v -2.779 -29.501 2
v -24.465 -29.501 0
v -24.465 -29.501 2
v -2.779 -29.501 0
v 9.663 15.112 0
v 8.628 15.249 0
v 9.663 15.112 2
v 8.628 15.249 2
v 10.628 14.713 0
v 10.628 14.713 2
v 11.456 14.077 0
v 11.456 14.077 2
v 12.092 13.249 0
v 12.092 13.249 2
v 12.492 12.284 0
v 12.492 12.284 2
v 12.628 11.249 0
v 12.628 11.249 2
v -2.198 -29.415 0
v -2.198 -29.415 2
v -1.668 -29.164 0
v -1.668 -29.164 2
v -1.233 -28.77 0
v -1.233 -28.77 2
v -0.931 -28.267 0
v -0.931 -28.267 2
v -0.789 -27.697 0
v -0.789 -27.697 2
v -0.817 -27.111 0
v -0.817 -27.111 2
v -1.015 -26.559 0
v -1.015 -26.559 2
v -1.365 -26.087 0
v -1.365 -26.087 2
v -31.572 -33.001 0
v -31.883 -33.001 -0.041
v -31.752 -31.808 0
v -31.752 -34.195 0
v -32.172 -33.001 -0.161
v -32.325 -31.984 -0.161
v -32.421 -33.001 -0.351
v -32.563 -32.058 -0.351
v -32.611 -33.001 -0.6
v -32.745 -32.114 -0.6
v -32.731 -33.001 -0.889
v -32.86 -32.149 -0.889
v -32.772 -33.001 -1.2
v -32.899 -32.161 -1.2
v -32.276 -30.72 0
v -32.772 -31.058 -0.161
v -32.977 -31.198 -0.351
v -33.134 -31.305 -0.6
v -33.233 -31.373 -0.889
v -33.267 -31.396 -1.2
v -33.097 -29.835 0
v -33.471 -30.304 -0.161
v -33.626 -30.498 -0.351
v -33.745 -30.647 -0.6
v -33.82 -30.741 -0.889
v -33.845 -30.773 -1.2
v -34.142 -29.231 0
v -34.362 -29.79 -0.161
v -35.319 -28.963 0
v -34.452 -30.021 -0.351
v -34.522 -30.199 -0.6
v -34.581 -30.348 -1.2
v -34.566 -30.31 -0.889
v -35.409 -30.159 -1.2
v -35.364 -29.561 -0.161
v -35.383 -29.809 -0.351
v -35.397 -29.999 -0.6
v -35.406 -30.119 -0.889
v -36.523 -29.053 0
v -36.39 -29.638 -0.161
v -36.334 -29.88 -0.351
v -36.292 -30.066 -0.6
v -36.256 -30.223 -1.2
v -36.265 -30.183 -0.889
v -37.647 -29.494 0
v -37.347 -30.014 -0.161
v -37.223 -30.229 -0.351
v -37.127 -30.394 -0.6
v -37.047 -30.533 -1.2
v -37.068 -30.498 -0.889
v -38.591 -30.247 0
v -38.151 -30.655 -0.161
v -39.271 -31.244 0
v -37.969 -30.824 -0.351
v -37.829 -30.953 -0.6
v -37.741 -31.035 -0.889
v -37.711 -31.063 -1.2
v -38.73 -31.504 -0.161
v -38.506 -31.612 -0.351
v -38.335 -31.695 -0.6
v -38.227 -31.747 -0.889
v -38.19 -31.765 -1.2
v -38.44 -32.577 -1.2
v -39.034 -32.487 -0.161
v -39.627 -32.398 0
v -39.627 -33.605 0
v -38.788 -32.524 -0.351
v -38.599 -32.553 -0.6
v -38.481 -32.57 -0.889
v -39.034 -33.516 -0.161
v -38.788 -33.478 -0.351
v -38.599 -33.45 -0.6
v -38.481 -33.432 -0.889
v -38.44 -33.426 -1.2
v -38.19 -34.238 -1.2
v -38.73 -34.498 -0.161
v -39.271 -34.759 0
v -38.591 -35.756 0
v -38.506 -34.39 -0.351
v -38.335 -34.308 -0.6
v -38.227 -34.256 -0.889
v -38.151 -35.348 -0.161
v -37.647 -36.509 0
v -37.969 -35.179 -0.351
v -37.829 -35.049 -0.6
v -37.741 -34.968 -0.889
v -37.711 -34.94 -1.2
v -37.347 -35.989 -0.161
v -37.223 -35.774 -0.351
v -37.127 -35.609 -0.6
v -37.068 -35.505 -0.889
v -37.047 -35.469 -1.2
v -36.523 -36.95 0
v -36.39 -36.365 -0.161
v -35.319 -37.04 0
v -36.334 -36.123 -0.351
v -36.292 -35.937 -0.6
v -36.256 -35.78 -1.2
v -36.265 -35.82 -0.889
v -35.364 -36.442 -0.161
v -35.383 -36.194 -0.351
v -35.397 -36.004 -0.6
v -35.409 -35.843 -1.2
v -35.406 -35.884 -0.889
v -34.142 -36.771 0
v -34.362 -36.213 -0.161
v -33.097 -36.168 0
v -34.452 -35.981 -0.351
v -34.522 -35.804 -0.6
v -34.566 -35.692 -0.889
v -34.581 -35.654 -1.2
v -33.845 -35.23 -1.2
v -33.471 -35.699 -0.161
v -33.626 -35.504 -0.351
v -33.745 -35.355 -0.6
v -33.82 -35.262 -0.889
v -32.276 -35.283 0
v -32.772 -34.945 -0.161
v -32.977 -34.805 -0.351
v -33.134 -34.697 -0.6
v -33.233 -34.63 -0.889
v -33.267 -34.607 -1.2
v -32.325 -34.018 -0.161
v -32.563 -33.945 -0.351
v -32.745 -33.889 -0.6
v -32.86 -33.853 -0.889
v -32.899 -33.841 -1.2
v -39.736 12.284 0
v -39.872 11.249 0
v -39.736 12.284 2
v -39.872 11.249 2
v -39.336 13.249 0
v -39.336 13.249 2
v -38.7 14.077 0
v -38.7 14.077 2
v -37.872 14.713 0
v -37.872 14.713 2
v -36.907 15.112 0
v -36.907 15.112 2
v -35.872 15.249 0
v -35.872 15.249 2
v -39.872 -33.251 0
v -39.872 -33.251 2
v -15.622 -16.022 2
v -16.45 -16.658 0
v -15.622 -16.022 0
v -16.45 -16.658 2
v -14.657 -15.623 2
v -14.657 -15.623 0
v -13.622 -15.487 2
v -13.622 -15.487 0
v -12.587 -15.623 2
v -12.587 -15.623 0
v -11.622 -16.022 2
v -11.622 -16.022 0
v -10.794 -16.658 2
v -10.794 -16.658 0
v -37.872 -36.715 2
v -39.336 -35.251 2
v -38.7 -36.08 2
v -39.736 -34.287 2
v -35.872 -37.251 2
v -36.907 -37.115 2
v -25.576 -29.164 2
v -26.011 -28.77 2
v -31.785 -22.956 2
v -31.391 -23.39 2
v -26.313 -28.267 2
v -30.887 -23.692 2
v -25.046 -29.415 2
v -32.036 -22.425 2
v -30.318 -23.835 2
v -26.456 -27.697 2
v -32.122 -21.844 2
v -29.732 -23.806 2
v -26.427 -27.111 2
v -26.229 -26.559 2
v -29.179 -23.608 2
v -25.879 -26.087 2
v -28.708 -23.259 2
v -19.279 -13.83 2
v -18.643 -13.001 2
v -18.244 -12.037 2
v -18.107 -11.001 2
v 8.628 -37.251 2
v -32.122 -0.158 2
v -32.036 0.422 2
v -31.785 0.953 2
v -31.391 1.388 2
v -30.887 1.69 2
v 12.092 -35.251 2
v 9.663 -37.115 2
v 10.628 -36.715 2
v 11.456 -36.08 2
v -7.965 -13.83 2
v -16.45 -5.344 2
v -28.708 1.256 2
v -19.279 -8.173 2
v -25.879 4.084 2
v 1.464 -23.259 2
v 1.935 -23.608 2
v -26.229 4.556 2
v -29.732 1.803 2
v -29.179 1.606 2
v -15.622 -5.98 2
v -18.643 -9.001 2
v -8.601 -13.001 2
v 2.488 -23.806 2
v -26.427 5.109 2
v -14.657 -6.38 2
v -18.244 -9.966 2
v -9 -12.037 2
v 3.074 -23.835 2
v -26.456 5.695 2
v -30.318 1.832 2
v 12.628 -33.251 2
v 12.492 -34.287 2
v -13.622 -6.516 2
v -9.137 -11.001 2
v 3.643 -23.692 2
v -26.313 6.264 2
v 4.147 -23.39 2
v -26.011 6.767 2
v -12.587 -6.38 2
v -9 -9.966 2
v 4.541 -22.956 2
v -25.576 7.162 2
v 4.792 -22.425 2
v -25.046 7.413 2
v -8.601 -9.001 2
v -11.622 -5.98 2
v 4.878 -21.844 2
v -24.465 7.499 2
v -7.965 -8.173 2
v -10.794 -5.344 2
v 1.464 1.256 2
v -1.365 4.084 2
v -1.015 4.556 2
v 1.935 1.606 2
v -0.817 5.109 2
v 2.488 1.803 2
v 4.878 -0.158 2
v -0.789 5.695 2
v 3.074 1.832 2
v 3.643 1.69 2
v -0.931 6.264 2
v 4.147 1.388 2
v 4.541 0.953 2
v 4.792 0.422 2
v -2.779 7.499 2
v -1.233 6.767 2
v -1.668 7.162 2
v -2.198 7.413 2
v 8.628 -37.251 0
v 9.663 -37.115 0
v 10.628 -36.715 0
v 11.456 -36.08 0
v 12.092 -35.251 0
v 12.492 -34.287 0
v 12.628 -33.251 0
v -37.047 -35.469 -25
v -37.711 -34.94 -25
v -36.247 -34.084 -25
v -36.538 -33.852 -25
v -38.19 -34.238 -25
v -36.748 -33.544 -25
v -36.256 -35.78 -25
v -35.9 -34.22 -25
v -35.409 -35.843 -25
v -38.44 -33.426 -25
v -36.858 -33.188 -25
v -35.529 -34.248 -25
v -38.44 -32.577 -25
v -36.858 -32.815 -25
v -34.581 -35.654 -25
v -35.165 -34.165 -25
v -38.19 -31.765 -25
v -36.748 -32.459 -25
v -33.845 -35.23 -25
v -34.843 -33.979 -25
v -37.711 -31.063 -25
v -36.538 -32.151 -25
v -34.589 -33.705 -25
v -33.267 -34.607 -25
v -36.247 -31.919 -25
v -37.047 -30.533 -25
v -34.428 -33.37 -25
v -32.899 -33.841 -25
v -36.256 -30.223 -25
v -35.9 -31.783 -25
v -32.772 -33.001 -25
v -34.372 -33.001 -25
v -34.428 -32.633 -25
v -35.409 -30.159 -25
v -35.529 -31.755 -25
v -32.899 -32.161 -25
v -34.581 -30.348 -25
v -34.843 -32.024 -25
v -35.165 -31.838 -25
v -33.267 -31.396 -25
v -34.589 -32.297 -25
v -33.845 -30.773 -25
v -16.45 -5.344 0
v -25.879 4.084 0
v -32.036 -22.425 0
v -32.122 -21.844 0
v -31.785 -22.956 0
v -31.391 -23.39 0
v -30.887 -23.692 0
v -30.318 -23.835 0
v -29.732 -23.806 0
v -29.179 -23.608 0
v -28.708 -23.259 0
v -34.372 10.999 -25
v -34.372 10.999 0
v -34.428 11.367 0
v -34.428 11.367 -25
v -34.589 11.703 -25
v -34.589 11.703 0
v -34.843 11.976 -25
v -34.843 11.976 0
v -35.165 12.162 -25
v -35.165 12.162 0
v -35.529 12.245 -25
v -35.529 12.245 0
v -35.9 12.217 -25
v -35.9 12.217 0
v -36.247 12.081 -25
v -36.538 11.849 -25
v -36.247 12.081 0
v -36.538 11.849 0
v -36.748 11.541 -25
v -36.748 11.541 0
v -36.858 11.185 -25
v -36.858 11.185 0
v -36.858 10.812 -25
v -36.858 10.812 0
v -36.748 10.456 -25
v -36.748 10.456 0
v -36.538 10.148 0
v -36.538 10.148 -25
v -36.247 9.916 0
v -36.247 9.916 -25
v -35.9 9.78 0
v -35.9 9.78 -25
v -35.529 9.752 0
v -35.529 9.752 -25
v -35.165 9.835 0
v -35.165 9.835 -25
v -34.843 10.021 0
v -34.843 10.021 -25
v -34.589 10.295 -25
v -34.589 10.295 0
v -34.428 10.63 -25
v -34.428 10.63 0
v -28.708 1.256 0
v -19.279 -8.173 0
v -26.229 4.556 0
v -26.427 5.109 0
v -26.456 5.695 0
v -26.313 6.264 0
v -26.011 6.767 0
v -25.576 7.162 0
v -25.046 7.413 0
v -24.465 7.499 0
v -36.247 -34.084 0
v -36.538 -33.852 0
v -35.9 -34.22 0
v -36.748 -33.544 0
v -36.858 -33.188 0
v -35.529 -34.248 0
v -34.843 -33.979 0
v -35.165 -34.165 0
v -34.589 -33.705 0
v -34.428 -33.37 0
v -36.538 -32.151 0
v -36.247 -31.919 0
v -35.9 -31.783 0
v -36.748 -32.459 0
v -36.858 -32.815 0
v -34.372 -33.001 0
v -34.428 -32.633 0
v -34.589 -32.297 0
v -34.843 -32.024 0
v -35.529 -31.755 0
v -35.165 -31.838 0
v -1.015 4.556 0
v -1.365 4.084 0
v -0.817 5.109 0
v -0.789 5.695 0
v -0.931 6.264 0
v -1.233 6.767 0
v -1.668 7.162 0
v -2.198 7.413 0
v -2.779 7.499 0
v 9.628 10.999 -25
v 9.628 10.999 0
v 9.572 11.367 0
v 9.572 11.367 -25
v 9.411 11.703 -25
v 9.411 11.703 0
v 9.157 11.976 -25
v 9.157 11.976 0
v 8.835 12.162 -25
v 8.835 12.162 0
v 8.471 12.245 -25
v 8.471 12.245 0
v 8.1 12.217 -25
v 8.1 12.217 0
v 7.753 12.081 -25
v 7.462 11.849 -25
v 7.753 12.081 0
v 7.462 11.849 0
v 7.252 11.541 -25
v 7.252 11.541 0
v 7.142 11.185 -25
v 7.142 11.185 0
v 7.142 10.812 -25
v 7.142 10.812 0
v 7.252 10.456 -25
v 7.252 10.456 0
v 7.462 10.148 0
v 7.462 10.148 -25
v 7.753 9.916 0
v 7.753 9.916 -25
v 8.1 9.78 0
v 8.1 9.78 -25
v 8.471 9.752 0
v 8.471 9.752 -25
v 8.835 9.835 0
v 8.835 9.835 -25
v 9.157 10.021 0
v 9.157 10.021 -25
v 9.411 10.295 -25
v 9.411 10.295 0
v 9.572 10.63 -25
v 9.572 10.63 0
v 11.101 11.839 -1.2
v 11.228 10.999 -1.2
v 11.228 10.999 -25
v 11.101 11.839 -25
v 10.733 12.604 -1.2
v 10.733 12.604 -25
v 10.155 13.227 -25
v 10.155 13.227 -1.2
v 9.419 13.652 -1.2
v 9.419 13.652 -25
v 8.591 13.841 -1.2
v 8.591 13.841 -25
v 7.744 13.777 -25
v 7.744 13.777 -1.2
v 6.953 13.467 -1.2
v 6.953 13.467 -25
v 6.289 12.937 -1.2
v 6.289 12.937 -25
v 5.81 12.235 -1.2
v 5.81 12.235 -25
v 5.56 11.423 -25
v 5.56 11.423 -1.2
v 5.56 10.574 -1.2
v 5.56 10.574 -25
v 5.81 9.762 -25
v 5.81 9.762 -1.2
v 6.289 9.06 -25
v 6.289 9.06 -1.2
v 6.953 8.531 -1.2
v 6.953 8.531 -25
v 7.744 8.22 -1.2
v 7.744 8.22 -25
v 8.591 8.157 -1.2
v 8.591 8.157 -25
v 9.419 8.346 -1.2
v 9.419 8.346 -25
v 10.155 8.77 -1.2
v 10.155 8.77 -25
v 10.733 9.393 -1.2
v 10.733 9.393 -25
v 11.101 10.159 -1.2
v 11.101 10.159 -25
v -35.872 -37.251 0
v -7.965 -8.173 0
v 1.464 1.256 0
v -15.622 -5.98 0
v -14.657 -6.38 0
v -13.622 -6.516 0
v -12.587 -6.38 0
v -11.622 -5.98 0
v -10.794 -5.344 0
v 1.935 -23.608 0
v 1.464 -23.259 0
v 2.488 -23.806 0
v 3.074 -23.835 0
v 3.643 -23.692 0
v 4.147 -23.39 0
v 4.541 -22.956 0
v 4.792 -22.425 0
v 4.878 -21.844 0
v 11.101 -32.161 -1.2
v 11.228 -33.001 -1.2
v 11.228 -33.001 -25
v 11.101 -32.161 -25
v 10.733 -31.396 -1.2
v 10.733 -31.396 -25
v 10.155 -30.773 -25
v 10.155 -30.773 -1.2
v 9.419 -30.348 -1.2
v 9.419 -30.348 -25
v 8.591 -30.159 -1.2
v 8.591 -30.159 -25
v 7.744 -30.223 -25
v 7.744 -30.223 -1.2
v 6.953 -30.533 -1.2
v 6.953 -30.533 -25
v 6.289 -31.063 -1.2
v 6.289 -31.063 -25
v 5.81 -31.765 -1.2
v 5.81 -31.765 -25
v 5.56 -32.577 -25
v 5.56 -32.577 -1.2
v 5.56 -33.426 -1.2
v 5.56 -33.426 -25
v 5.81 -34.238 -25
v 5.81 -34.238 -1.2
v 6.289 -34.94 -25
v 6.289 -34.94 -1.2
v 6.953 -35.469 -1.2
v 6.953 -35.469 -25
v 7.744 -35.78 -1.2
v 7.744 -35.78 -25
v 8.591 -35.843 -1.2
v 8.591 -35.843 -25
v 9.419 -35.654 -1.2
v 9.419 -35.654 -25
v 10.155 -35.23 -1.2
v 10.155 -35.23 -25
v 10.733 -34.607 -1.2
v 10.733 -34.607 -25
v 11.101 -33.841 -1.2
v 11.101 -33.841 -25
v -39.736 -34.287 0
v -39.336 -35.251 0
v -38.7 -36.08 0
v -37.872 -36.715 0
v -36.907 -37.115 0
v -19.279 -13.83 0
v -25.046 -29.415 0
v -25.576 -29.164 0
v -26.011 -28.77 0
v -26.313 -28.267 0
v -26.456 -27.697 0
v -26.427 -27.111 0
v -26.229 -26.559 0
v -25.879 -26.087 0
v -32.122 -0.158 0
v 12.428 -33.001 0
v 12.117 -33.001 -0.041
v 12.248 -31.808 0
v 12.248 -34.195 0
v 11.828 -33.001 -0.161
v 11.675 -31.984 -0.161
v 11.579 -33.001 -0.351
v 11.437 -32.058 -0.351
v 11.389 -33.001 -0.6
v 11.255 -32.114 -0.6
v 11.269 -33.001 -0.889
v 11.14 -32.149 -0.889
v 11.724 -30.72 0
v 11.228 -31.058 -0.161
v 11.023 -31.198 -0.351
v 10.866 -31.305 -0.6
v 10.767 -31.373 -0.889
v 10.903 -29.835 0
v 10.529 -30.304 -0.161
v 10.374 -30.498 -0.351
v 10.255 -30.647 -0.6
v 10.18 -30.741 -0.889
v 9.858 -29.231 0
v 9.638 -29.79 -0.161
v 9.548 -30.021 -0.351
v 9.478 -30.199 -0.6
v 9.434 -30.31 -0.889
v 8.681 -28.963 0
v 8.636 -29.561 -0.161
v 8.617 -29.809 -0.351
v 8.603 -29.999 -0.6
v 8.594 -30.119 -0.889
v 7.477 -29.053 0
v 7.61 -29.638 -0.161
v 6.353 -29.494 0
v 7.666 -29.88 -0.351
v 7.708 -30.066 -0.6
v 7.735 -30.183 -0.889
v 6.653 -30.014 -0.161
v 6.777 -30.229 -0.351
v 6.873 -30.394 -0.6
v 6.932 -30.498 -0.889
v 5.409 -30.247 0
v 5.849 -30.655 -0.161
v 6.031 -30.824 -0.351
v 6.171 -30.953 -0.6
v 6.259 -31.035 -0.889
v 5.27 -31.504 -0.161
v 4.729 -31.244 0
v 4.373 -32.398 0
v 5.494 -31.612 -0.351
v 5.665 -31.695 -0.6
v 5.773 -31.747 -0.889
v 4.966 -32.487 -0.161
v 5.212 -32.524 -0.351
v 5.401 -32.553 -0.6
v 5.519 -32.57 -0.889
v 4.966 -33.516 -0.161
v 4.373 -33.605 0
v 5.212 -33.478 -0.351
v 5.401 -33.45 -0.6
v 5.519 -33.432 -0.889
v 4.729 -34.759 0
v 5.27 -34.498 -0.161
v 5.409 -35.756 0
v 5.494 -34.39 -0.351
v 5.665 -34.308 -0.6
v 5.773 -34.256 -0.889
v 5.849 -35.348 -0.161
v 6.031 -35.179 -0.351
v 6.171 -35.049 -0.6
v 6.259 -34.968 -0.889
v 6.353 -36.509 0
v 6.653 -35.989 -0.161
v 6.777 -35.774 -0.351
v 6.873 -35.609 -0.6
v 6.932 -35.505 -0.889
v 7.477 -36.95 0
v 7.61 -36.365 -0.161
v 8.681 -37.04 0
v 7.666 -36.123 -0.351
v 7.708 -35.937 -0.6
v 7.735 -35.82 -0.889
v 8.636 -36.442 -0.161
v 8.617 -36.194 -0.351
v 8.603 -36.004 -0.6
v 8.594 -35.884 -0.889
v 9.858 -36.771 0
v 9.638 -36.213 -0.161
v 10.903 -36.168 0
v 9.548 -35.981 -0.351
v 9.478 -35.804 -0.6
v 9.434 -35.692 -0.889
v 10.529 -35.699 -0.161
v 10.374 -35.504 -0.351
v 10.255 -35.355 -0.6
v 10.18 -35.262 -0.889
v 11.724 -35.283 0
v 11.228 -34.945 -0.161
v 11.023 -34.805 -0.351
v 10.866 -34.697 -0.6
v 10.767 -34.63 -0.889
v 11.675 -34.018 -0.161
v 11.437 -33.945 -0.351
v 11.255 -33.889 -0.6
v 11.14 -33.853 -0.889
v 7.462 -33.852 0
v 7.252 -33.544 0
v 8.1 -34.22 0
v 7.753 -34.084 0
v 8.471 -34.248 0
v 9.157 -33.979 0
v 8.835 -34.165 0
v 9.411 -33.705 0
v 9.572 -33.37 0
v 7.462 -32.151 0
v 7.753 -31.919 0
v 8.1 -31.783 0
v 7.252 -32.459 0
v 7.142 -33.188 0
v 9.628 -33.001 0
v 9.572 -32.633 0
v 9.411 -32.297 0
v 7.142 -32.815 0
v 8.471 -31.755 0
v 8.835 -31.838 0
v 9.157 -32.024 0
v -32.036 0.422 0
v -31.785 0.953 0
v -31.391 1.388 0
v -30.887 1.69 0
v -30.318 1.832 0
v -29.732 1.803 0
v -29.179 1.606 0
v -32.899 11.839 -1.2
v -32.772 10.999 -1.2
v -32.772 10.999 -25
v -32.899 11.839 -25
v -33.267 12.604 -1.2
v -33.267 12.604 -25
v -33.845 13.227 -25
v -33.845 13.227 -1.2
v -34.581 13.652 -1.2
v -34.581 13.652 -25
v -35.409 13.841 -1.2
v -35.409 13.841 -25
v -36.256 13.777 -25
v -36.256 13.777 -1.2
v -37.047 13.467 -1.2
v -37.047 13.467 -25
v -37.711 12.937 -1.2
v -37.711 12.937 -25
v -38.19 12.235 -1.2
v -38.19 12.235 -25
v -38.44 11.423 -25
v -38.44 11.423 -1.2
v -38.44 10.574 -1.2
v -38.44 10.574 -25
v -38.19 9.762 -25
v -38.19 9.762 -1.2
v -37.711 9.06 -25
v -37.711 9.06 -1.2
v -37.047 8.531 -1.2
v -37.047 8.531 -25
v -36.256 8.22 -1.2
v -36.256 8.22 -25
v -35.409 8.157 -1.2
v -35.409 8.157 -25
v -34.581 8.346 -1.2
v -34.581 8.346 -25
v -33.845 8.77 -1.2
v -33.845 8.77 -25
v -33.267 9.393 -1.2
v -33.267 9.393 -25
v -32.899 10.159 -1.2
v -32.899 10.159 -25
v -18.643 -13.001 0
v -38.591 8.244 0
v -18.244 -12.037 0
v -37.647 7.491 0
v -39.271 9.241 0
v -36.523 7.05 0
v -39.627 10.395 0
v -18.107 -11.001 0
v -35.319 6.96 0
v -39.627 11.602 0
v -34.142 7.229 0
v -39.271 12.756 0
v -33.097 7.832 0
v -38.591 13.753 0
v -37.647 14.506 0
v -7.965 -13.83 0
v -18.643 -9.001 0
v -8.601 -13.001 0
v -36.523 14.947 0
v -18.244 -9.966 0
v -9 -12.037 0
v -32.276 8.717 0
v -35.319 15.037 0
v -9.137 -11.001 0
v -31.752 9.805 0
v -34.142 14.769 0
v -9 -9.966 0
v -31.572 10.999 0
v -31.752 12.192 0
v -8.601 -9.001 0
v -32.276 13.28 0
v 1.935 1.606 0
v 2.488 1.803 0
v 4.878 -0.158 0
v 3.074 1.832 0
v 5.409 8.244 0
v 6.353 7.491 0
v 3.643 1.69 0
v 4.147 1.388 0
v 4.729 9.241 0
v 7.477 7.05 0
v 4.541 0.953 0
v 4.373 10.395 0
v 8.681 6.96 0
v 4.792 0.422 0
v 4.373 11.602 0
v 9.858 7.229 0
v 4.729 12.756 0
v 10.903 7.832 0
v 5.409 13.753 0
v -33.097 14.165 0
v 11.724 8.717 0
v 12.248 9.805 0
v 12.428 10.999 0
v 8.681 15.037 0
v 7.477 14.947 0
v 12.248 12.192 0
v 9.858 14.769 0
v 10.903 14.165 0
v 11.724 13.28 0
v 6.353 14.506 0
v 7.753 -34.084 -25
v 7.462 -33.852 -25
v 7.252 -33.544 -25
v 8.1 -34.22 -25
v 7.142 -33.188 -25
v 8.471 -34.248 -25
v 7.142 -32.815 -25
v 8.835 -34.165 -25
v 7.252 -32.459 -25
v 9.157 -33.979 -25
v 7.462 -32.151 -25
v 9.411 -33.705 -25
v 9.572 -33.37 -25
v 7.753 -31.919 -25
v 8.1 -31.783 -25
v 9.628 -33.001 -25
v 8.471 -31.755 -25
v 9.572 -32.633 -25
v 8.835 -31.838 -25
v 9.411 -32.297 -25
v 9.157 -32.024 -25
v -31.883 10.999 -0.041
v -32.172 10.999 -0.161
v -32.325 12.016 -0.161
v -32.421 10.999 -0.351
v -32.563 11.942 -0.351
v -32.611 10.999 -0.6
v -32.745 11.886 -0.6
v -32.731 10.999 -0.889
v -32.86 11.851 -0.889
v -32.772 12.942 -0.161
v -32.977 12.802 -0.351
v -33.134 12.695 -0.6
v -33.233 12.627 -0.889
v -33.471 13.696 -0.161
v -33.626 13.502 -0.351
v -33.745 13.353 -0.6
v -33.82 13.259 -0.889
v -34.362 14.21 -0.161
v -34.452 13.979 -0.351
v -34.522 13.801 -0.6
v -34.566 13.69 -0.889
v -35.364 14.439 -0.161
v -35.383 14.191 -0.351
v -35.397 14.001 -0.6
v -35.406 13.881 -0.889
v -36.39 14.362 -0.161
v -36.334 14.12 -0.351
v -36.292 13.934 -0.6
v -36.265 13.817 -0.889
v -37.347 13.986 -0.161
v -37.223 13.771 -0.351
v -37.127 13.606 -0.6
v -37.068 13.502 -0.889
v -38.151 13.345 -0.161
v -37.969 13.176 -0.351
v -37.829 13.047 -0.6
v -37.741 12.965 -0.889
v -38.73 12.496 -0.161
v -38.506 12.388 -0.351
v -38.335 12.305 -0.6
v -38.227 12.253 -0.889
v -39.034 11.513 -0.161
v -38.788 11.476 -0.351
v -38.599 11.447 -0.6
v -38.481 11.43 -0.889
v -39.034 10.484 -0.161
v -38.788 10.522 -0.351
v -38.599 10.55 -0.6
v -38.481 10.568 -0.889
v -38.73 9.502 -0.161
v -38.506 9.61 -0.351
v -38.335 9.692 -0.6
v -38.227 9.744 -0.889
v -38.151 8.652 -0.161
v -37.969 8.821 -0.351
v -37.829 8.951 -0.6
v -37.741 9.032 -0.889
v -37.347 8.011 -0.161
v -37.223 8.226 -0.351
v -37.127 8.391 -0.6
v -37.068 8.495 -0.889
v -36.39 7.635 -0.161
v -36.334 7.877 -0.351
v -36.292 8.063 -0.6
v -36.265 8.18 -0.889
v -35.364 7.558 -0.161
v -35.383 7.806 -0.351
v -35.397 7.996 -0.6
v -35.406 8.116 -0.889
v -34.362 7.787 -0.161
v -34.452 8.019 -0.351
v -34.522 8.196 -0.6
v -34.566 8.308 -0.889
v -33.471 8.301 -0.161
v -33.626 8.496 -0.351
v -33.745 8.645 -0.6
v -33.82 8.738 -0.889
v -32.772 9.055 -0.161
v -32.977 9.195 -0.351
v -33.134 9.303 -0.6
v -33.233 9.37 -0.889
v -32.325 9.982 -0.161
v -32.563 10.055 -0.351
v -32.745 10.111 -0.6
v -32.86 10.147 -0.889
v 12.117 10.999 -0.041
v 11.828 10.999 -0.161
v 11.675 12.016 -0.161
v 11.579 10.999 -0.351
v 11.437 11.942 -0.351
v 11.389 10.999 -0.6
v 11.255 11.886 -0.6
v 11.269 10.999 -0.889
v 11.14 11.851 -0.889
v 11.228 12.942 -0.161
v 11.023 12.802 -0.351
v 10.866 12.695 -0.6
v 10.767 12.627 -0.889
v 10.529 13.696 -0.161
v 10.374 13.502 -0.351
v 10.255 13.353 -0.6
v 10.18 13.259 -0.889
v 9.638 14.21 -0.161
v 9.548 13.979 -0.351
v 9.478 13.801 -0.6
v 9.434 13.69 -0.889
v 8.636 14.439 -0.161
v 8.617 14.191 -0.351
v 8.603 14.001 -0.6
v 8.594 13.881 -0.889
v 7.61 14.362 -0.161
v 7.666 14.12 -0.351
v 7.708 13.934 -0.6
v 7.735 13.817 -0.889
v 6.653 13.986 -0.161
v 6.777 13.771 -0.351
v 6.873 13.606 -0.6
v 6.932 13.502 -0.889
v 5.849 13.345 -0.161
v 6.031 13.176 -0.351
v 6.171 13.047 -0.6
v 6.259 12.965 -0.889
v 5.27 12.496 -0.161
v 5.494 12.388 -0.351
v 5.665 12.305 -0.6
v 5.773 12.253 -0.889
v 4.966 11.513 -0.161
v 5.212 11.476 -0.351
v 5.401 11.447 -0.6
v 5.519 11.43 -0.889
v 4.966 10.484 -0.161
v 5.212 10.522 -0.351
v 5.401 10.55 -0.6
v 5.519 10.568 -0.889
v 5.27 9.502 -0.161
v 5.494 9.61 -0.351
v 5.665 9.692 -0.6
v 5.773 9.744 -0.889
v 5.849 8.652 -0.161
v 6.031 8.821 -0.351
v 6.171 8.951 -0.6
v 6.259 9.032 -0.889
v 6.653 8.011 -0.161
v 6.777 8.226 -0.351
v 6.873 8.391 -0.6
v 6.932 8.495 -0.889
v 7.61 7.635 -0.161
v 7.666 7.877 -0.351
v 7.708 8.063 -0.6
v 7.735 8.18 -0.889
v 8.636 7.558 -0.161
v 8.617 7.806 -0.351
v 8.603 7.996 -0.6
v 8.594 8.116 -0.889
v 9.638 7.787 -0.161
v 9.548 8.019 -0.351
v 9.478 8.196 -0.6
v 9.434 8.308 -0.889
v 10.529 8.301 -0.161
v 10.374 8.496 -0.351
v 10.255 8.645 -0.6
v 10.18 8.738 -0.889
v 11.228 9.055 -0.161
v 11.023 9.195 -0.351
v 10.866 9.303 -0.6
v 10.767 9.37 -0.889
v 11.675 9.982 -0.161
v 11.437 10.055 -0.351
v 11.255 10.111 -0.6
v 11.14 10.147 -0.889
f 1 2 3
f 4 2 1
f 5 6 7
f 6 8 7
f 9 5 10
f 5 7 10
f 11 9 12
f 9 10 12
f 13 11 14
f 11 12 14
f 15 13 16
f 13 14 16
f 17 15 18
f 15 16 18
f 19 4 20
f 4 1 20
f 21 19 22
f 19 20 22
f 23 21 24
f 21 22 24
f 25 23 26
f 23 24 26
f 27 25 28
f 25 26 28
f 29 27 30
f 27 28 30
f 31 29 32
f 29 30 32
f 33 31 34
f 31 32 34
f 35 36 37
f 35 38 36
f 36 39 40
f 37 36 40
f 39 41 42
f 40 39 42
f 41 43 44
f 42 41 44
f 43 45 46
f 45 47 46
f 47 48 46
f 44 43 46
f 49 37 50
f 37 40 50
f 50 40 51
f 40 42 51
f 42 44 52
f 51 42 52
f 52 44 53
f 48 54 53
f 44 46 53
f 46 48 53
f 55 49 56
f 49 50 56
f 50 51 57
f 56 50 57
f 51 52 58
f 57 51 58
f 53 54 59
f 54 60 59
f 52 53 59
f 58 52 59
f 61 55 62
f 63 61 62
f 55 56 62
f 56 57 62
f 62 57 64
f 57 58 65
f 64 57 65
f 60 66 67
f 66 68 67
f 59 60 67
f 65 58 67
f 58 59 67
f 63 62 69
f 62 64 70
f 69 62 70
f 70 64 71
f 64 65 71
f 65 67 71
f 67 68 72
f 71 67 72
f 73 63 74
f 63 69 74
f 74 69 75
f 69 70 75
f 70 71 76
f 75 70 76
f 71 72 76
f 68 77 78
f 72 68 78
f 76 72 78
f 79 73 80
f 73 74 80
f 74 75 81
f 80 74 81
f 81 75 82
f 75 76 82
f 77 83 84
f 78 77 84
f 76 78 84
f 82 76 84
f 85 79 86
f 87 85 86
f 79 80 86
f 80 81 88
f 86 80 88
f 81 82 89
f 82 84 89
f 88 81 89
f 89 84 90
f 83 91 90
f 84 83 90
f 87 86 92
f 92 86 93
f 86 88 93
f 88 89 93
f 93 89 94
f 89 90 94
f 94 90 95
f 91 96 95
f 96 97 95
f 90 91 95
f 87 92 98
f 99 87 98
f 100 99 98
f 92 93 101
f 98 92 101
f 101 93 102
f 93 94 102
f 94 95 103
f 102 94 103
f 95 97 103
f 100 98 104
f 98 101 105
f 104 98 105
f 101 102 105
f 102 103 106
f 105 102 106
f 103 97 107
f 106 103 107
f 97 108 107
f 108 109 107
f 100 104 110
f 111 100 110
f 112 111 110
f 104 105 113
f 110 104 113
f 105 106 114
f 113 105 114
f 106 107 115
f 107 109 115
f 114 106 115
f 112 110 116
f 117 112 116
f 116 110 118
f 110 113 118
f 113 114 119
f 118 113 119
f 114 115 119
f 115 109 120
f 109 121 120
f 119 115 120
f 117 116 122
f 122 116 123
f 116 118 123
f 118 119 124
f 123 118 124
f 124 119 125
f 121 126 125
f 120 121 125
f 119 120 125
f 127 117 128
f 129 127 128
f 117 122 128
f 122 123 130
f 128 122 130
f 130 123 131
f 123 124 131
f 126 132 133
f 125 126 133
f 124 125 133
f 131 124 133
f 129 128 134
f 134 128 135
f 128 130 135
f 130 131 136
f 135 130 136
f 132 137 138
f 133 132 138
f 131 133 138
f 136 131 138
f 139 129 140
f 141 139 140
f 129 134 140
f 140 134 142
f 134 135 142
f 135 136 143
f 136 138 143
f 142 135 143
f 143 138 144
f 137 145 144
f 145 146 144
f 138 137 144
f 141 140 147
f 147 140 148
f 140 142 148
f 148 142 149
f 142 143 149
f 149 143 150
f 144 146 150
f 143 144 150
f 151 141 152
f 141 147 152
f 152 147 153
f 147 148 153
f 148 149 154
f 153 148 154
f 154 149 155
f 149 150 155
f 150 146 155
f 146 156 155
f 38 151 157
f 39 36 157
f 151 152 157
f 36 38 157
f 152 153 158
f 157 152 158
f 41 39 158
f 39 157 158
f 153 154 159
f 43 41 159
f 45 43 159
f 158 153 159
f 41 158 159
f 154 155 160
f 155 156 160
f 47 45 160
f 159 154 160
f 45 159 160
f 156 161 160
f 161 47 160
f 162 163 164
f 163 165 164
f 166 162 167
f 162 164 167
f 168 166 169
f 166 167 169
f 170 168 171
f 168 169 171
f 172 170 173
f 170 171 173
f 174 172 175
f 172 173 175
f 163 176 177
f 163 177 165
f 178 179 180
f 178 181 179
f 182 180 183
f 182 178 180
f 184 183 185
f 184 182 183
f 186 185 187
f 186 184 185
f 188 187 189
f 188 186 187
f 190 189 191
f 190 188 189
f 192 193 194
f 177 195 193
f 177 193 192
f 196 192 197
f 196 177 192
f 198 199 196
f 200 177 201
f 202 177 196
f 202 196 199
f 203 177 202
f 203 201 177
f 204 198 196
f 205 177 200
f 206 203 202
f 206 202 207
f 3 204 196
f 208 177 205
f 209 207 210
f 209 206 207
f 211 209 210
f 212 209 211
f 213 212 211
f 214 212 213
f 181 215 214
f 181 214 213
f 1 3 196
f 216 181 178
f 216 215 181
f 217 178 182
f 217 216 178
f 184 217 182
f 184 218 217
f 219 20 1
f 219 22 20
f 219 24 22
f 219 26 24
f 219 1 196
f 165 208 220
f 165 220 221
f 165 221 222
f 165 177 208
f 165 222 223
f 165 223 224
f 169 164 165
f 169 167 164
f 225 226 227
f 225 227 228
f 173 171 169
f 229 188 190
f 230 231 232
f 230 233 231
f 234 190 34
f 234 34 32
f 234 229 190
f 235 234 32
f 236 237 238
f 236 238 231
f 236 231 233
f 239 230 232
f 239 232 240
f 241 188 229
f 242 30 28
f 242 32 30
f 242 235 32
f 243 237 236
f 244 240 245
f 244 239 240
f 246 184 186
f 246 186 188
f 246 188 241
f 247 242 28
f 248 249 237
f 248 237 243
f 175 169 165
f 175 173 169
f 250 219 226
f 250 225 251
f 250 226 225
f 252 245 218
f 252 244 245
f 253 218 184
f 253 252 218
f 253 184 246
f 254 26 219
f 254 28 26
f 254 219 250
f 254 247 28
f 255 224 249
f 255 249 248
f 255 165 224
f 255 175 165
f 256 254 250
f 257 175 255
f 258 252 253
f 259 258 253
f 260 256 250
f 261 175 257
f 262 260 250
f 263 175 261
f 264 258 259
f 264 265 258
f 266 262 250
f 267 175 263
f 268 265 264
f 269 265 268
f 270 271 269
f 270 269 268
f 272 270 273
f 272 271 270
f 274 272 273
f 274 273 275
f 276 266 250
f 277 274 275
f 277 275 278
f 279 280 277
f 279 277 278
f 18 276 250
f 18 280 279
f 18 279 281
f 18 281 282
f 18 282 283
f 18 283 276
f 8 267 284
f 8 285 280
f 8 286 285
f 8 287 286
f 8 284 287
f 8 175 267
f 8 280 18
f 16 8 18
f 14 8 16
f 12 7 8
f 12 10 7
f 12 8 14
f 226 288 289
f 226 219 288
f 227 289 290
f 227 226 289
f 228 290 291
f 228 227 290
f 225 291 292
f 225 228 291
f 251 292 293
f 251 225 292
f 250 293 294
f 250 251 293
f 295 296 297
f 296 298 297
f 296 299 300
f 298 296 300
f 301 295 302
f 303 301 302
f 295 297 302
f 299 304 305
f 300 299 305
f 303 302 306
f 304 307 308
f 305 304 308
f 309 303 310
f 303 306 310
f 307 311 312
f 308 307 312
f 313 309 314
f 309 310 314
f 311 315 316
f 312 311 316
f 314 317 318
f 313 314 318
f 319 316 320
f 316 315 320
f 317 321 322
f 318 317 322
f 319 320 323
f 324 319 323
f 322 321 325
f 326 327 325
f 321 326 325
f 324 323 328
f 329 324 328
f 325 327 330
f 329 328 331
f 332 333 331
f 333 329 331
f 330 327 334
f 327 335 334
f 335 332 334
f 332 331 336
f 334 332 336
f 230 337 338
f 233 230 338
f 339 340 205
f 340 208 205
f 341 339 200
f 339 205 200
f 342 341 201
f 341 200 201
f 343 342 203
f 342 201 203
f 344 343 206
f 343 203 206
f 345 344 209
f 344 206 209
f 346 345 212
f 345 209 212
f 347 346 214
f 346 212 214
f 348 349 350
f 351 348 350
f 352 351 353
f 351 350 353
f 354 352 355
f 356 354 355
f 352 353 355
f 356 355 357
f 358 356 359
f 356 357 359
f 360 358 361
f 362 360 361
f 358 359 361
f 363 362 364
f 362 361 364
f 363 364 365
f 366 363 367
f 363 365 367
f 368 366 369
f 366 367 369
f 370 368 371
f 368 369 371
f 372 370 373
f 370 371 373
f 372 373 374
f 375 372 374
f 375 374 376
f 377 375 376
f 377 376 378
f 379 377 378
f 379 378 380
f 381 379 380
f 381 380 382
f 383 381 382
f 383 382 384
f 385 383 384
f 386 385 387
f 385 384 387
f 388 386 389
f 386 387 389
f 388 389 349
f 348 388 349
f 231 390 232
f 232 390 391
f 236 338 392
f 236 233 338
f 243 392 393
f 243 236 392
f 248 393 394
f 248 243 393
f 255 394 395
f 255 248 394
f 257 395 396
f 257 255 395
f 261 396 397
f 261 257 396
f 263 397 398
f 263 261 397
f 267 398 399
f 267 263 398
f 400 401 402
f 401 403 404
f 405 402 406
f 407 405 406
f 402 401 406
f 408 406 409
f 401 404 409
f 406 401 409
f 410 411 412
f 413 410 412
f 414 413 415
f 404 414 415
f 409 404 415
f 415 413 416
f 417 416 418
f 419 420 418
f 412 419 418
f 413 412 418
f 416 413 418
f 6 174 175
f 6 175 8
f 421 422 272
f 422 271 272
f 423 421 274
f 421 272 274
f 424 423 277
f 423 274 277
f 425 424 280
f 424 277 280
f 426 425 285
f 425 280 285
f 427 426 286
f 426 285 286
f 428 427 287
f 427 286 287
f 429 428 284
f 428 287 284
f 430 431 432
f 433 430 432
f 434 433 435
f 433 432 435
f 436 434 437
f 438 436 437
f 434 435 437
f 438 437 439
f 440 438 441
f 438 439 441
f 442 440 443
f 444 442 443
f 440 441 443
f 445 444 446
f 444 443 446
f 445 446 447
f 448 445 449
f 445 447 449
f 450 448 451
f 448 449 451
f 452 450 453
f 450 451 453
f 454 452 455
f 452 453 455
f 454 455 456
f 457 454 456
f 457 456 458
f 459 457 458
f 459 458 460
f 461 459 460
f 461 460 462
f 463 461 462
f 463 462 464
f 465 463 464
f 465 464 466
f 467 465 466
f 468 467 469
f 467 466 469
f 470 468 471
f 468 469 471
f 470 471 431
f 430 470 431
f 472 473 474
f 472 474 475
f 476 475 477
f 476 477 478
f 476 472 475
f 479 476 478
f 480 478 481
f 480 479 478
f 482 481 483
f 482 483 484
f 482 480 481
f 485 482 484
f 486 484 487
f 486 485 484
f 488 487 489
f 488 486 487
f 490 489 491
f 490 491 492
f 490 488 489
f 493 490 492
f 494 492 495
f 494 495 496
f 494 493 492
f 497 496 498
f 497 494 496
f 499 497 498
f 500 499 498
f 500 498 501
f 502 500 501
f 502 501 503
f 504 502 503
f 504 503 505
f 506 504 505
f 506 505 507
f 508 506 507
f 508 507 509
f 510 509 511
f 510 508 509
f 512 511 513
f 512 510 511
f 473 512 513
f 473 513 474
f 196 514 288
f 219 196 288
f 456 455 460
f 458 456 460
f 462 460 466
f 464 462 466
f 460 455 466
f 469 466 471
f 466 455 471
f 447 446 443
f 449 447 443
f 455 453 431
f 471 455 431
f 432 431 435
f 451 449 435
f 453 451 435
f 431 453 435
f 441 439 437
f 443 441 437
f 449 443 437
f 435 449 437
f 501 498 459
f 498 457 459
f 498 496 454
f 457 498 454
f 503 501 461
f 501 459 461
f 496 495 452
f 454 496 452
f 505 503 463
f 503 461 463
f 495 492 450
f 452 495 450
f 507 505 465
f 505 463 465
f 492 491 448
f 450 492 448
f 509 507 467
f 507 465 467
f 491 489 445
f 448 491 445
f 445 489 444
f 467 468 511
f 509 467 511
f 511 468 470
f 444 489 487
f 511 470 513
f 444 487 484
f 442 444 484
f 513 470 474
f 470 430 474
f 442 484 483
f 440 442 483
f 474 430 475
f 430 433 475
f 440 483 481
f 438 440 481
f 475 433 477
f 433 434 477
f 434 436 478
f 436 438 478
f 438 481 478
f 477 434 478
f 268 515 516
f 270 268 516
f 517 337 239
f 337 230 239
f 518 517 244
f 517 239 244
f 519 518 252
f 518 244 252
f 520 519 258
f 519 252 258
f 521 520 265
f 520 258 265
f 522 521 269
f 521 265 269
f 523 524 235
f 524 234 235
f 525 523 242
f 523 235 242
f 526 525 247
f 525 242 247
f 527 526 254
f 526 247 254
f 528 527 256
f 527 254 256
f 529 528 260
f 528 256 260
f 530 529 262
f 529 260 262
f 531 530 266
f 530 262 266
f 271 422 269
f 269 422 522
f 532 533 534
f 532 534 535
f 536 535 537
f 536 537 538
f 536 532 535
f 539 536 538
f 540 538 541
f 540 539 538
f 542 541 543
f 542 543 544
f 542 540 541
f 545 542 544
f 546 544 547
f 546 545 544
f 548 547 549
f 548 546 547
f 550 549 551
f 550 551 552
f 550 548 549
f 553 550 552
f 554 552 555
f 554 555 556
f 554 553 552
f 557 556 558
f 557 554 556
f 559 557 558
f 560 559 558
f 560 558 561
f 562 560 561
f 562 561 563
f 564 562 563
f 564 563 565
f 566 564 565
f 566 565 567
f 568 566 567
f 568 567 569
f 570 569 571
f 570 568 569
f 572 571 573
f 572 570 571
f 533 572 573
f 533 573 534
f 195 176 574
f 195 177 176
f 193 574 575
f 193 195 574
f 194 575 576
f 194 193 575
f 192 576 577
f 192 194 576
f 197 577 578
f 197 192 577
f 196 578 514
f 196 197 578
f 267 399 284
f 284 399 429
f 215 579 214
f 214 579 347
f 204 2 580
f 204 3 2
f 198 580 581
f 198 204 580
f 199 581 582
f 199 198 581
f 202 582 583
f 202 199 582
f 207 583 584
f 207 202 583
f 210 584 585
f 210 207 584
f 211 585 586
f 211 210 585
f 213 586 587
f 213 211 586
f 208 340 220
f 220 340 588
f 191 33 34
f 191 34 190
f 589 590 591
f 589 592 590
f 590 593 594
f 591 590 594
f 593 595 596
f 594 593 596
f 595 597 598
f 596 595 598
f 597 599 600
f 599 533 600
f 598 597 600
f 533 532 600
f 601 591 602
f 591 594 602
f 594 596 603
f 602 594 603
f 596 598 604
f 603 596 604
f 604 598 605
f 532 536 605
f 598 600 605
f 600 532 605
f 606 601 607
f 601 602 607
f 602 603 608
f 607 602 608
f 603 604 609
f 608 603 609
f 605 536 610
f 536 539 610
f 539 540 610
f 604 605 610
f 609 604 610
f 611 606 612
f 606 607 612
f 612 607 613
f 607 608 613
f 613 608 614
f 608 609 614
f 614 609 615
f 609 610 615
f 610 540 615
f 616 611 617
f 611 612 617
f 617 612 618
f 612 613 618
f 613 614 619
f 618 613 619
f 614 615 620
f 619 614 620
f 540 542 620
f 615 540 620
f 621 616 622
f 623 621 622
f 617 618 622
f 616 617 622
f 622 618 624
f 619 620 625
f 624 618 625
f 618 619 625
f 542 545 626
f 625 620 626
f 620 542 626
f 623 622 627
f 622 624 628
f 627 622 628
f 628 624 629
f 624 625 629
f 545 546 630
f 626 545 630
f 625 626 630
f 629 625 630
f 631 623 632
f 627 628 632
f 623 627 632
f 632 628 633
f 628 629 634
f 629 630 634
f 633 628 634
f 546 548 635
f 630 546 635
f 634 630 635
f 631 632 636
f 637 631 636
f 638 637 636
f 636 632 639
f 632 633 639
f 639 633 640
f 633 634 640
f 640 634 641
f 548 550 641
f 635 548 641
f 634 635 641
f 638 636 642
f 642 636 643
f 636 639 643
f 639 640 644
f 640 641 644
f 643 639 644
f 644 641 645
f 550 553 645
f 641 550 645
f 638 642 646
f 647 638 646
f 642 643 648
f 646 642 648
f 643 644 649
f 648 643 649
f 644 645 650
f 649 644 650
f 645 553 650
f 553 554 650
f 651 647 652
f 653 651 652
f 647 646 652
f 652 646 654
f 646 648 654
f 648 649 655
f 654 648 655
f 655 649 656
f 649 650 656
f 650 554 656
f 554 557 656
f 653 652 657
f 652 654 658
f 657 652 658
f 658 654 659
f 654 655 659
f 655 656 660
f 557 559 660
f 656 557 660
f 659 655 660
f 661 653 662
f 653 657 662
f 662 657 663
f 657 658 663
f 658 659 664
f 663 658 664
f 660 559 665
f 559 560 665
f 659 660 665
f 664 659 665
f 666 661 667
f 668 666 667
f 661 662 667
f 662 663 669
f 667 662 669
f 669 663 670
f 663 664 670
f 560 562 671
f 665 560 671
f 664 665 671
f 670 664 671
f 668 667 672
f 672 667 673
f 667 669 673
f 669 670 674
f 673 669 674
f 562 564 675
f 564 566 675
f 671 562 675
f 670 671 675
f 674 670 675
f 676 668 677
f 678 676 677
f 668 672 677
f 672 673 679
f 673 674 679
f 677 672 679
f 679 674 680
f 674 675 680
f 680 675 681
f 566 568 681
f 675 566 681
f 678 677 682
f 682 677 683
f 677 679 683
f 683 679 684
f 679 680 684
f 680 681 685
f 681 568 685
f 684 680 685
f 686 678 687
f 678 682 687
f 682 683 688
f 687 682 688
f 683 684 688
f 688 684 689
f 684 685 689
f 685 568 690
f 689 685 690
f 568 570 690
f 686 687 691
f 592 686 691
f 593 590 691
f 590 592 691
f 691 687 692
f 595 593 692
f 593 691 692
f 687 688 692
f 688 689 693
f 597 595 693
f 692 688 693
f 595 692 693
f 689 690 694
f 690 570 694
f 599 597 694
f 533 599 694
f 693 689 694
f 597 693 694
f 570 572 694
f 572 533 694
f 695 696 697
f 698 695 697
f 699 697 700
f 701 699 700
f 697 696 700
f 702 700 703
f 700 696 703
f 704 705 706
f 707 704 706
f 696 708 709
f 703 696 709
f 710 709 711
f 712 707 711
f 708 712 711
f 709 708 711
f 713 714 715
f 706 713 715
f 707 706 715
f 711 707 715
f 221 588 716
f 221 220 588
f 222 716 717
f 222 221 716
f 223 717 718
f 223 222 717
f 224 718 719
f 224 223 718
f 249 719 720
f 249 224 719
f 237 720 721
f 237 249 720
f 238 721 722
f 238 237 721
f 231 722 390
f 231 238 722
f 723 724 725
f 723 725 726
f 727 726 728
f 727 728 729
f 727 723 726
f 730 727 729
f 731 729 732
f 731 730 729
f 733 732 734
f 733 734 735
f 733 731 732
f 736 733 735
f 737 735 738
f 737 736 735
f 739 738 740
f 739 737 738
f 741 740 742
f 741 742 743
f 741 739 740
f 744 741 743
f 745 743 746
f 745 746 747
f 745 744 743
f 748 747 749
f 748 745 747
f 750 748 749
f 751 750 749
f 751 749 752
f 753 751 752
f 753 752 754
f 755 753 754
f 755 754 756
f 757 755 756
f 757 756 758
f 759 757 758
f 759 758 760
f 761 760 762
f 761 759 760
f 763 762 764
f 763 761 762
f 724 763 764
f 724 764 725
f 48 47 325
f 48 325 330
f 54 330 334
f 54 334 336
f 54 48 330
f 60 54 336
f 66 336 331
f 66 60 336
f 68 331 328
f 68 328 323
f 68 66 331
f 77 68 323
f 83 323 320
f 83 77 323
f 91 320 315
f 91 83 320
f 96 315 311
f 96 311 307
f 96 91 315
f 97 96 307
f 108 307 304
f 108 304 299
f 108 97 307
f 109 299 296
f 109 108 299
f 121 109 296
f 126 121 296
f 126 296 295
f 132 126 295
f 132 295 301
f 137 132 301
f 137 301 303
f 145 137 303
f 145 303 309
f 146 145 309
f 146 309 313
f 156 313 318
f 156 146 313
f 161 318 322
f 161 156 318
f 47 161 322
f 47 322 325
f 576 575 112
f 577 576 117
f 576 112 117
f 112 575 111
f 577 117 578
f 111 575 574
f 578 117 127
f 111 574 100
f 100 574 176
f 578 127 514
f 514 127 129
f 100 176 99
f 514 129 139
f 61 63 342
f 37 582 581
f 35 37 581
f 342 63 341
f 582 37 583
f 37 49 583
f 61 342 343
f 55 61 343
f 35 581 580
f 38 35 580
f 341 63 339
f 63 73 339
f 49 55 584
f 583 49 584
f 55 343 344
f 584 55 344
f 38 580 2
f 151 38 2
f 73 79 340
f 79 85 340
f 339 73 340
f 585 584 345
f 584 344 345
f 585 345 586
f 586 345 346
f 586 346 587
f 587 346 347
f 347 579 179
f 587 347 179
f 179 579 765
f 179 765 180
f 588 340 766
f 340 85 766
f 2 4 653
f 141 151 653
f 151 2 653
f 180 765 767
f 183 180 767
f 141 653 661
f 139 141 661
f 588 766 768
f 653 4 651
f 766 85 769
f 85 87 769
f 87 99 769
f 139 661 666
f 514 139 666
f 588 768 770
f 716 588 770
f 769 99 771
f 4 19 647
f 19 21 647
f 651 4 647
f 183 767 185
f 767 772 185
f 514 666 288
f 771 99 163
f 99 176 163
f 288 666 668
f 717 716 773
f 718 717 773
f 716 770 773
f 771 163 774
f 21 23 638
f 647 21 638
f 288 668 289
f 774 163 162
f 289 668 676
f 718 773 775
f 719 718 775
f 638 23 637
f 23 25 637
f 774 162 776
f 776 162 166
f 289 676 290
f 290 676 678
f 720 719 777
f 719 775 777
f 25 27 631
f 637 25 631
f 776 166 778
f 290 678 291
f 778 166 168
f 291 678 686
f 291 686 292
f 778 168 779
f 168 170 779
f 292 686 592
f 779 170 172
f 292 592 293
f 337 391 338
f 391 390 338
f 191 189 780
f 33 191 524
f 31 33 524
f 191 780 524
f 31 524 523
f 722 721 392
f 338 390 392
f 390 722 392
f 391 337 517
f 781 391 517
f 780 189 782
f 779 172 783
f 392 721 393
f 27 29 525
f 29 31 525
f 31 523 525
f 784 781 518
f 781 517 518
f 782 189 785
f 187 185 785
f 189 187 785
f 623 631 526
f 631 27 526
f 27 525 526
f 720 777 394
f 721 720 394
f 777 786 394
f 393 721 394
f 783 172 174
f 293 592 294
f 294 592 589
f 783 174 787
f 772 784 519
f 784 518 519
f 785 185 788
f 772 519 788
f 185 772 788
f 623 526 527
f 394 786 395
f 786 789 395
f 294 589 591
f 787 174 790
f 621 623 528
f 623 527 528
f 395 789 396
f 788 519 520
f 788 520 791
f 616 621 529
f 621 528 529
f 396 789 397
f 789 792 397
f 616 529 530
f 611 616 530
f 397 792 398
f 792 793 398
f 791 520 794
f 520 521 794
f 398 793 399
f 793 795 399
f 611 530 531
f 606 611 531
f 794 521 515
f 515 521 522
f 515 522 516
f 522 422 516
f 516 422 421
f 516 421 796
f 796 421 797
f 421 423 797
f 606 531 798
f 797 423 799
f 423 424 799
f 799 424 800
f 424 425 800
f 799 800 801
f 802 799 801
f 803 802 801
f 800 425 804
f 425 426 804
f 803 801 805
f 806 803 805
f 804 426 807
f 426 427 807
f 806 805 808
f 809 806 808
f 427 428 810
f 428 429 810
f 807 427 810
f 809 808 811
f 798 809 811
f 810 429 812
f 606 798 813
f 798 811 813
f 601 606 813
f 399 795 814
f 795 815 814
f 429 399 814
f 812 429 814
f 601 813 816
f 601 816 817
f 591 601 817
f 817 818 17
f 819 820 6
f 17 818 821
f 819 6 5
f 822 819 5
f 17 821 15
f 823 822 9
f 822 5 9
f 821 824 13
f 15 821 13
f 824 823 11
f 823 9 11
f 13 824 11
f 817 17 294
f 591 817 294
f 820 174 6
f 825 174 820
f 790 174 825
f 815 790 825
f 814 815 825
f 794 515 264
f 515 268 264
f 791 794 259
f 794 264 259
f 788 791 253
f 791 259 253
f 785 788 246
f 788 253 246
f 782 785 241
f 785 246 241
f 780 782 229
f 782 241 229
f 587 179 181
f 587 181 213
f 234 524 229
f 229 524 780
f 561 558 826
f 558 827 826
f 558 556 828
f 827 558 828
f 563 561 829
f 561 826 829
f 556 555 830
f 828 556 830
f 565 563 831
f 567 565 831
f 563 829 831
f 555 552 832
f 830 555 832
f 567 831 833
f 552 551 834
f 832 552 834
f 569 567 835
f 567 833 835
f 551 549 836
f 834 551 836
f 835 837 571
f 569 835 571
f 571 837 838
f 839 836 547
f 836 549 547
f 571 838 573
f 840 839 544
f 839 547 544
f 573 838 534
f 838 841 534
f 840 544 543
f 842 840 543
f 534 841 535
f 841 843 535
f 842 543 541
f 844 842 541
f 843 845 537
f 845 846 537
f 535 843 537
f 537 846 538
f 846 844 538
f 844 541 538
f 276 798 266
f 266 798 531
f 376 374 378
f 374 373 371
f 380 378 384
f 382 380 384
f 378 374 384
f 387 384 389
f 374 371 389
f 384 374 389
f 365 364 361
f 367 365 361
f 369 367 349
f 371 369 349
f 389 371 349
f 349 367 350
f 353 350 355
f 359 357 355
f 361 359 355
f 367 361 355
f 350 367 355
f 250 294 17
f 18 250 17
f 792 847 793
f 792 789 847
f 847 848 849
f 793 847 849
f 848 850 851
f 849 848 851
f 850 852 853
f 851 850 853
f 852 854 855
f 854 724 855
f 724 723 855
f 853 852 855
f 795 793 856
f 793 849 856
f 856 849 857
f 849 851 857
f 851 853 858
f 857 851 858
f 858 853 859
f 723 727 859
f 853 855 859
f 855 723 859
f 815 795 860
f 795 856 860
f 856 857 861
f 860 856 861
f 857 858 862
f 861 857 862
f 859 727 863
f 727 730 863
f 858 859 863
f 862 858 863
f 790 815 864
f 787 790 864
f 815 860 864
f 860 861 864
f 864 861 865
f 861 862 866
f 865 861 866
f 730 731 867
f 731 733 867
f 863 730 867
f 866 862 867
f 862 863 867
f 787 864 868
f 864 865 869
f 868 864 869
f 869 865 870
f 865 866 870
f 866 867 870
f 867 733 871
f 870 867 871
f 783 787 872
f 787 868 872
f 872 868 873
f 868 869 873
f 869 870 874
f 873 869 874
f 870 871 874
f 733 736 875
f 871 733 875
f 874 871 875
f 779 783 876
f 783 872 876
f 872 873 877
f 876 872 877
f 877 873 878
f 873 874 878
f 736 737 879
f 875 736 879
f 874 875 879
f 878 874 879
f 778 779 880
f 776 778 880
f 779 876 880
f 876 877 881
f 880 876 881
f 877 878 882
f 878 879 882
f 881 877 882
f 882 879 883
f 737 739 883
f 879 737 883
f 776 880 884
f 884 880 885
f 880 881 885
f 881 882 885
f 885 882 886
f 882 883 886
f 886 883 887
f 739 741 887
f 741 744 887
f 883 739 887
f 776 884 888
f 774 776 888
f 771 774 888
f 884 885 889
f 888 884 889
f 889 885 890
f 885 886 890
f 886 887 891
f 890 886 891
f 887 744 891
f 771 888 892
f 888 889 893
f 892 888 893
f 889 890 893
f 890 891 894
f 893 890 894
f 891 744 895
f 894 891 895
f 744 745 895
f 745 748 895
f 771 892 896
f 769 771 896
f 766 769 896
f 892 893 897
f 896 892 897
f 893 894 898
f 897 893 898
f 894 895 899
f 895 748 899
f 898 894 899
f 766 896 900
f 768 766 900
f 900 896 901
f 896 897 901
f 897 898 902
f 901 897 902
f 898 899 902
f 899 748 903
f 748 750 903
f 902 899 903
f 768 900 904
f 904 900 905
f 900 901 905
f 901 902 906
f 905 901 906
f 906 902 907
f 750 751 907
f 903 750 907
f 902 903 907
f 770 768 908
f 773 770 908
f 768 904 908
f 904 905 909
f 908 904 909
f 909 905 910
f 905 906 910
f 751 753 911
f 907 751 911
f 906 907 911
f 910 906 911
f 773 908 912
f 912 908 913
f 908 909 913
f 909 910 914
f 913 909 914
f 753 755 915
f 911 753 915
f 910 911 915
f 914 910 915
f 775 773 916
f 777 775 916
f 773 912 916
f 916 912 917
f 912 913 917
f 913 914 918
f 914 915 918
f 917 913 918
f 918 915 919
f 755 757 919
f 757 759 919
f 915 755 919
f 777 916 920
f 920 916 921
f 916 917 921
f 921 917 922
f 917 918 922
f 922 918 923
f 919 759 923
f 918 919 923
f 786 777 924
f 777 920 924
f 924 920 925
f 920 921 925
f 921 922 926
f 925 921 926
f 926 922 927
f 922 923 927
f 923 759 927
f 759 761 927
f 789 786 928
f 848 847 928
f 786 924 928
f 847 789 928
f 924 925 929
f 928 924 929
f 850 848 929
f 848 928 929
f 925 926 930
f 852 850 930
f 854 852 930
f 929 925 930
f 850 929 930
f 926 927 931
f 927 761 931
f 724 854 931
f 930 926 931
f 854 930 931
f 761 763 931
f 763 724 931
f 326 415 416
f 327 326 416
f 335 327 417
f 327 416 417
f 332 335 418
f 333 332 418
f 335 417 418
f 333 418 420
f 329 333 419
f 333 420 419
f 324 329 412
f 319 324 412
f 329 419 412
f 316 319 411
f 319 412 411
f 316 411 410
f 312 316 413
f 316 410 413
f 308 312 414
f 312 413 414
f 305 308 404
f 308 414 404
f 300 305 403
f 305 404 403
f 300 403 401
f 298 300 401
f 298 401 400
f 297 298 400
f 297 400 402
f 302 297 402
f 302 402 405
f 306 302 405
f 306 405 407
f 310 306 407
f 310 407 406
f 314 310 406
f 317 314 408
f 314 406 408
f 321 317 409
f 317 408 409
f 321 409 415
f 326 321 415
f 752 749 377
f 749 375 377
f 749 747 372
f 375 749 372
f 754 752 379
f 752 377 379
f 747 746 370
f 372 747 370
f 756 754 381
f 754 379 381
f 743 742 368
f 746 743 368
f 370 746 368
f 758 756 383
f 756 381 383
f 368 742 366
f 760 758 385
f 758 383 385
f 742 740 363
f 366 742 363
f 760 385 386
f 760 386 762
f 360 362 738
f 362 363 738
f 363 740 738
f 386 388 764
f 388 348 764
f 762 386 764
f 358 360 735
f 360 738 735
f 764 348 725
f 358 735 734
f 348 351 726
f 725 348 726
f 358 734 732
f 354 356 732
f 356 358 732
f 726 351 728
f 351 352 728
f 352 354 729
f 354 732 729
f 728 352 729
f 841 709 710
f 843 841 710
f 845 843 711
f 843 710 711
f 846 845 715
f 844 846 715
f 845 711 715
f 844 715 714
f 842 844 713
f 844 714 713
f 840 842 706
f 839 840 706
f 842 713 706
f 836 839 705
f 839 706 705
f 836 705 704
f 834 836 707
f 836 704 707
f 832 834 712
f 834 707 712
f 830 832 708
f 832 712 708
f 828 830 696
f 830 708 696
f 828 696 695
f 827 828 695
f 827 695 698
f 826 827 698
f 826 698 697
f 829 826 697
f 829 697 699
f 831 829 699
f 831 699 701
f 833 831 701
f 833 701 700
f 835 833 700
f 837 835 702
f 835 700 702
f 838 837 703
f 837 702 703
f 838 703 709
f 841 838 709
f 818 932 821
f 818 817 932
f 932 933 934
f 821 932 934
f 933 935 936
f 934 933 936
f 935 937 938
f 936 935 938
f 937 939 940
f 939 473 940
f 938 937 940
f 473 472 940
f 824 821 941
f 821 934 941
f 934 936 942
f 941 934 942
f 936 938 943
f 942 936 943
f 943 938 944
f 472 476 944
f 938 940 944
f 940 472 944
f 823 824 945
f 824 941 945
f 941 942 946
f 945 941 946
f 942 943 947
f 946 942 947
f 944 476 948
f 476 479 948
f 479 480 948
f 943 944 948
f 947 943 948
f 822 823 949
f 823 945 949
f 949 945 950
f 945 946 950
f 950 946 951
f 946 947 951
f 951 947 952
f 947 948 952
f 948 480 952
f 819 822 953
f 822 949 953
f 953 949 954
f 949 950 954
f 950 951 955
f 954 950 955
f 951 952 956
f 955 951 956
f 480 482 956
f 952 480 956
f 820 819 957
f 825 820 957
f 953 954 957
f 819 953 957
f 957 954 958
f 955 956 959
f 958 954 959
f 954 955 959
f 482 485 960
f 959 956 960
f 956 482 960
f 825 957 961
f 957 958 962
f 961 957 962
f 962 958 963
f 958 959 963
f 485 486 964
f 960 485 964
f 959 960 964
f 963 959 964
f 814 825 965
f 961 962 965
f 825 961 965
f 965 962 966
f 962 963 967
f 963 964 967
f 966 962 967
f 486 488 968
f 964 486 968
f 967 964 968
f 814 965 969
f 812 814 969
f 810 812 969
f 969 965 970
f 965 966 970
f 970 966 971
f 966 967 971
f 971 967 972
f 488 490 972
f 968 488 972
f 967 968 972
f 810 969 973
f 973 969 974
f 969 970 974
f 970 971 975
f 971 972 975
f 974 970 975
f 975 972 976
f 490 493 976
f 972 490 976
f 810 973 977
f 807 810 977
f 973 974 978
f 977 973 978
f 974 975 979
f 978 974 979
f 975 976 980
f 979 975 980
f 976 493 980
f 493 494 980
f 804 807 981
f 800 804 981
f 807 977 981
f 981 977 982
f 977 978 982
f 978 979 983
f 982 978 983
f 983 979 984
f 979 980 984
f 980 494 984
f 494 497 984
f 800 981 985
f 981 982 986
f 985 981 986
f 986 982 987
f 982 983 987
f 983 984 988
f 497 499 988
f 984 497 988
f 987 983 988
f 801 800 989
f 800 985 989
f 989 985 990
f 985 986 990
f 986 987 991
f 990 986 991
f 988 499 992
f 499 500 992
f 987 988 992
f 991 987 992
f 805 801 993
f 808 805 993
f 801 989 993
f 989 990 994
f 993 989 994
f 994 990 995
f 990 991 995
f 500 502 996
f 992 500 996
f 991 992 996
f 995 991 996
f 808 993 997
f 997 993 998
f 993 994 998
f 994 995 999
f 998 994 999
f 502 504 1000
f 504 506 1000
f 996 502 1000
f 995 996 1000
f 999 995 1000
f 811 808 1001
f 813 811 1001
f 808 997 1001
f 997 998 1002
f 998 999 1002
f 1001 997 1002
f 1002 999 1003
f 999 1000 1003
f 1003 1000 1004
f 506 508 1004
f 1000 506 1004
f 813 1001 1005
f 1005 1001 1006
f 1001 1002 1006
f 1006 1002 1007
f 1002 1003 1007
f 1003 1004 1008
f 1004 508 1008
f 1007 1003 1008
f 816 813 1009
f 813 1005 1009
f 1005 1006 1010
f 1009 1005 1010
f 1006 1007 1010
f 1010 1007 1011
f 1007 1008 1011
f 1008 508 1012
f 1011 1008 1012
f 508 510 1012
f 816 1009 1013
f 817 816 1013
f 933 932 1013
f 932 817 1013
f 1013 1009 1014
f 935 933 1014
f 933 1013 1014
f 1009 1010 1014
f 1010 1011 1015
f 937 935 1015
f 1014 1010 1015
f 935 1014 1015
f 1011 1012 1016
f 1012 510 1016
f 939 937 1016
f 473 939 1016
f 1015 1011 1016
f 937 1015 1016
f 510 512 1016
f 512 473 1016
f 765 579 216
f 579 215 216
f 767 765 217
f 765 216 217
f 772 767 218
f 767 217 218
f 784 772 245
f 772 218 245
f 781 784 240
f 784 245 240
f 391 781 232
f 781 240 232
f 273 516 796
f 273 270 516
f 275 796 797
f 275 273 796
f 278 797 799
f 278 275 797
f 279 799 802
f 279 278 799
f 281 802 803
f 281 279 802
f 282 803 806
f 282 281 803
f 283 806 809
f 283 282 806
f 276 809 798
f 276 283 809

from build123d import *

# Parameters (mm, degrees)
SKETCH1_W           = 52.5
SKETCH1_H           = 52.5
BOSS_EXTRUDE1_DEPTH = 2
SKETCH1_3_R         = 2.85
SKETCH1_3_R_2       = 1.25
BOSS_EXTRUDE2_DEPTH = 25
FILLET1_R           = 4
FILLET2_R           = 1.2
FILLET3_R           = 2
FILLET4_R           = 4


with BuildPart() as part:
    # Sketch1 → Boss-Extrude1 (new body)
    with BuildSketch(Plane.XY):
        with Locations((-13.622062437, -11.00131333)):
            Rectangle(SKETCH1_W, SKETCH1_H)
        Polygon((2.049510438, -29.50131333), (-29.293635312, -29.50131333), (-13.622062437, -13.829740455), align=None, mode=Mode.SUBTRACT)
        Polygon((-32.122062437, -26.672886205), (-32.122062437, 4.670259545), (-16.450489562, -11.00131333), align=None, mode=Mode.SUBTRACT)
        Polygon((-10.793635312, -11.00131333), (4.877937563, 4.670259545), (4.877937563, -26.672886205), align=None, mode=Mode.SUBTRACT)
        Polygon((-13.622062437, -8.172886205), (-29.293635312, 7.49868667), (2.049510438, 7.49868667), align=None, mode=Mode.SUBTRACT)
    extrude(amount=BOSS_EXTRUDE1_DEPTH)

    # Sketch1<3> → Boss-Extrude2 (add)
    # profile 1 of 4: a face of its own
    with BuildSketch(Plane.XY):
        with Locations((-35.622062437, 10.99868667)):
            Circle(SKETCH1_3_R)
        with Locations((-35.622062437, 10.99868667)):
            Circle(SKETCH1_3_R_2, mode=Mode.SUBTRACT)
    # profile 2 of 4: a face of its own
    with BuildSketch(Plane.XY):
        with Locations((8.377937563, 10.99868667)):
            Circle(SKETCH1_3_R)
        with Locations((8.377937563, 10.99868667)):
            Circle(SKETCH1_3_R_2, mode=Mode.SUBTRACT)
    # profile 3 of 4: a face of its own
    with BuildSketch(Plane.XY):
        with Locations((-35.622062437, -33.00131333)):
            Circle(SKETCH1_3_R)
        with Locations((-35.622062437, -33.00131333)):
            Circle(SKETCH1_3_R_2, mode=Mode.SUBTRACT)
    # profile 4 of 4: a face of its own
    with BuildSketch(Plane.XY):
        with Locations((8.377937563, -33.00131333)):
            Circle(SKETCH1_3_R)
        with Locations((8.377937563, -33.00131333)):
            Circle(SKETCH1_3_R_2, mode=Mode.SUBTRACT)
    extrude(amount=-BOSS_EXTRUDE2_DEPTH)

    # Fillet1
    fillet1_edges = [part.edges().sort_by_distance(p)[0] for p in [
        (-39.872062437, 15.24868667, 1),
        (12.627937563, -37.25131333, 1),
        (12.627937563, 15.24868667, 1),
        (-39.872062437, -37.25131333, 1),
    ]]
    fillet(fillet1_edges, radius=FILLET1_R)

    # Fillet2
    fillet2_edges = [part.edges().sort_by_distance(p)[0] for p in [
        (5.527937563, -33.00131333, 0),
        (-38.472062437, -33.00131333, 0),
        (-38.472062437, 10.99868667, 0),
        (5.527937563, 10.99868667, 0),
    ]]
    fillet(fillet2_edges, radius=FILLET2_R)

    # Fillet3
    fillet3_edges = [part.edges().sort_by_distance(p)[0] for p in [
        (-29.293635312, 7.49868667, 1),
        (2.049510438, 7.49868667, 1),
        (4.877937563, 4.670259545, 1),
        (4.877937563, -26.672886205, 1),
        (2.049510438, -29.50131333, 1),
        (-29.293635312, -29.50131333, 1),
        (-32.122062437, -26.672886205, 1),
        (-32.122062437, 4.670259545, 1),
    ]]
    fillet(fillet3_edges, radius=FILLET3_R)

    # Fillet4
    fillet4_edges = [part.edges().sort_by_distance(p)[0] for p in [
        (-13.622062437, -8.172886205, 1),
        (-16.450489562, -11.00131333, 1),
        (-13.622062437, -13.829740455, 1),
        (-10.793635312, -11.00131333, 1),
    ]]
    fillet(fillet4_edges, radius=FILLET4_R)


solid = part.part
